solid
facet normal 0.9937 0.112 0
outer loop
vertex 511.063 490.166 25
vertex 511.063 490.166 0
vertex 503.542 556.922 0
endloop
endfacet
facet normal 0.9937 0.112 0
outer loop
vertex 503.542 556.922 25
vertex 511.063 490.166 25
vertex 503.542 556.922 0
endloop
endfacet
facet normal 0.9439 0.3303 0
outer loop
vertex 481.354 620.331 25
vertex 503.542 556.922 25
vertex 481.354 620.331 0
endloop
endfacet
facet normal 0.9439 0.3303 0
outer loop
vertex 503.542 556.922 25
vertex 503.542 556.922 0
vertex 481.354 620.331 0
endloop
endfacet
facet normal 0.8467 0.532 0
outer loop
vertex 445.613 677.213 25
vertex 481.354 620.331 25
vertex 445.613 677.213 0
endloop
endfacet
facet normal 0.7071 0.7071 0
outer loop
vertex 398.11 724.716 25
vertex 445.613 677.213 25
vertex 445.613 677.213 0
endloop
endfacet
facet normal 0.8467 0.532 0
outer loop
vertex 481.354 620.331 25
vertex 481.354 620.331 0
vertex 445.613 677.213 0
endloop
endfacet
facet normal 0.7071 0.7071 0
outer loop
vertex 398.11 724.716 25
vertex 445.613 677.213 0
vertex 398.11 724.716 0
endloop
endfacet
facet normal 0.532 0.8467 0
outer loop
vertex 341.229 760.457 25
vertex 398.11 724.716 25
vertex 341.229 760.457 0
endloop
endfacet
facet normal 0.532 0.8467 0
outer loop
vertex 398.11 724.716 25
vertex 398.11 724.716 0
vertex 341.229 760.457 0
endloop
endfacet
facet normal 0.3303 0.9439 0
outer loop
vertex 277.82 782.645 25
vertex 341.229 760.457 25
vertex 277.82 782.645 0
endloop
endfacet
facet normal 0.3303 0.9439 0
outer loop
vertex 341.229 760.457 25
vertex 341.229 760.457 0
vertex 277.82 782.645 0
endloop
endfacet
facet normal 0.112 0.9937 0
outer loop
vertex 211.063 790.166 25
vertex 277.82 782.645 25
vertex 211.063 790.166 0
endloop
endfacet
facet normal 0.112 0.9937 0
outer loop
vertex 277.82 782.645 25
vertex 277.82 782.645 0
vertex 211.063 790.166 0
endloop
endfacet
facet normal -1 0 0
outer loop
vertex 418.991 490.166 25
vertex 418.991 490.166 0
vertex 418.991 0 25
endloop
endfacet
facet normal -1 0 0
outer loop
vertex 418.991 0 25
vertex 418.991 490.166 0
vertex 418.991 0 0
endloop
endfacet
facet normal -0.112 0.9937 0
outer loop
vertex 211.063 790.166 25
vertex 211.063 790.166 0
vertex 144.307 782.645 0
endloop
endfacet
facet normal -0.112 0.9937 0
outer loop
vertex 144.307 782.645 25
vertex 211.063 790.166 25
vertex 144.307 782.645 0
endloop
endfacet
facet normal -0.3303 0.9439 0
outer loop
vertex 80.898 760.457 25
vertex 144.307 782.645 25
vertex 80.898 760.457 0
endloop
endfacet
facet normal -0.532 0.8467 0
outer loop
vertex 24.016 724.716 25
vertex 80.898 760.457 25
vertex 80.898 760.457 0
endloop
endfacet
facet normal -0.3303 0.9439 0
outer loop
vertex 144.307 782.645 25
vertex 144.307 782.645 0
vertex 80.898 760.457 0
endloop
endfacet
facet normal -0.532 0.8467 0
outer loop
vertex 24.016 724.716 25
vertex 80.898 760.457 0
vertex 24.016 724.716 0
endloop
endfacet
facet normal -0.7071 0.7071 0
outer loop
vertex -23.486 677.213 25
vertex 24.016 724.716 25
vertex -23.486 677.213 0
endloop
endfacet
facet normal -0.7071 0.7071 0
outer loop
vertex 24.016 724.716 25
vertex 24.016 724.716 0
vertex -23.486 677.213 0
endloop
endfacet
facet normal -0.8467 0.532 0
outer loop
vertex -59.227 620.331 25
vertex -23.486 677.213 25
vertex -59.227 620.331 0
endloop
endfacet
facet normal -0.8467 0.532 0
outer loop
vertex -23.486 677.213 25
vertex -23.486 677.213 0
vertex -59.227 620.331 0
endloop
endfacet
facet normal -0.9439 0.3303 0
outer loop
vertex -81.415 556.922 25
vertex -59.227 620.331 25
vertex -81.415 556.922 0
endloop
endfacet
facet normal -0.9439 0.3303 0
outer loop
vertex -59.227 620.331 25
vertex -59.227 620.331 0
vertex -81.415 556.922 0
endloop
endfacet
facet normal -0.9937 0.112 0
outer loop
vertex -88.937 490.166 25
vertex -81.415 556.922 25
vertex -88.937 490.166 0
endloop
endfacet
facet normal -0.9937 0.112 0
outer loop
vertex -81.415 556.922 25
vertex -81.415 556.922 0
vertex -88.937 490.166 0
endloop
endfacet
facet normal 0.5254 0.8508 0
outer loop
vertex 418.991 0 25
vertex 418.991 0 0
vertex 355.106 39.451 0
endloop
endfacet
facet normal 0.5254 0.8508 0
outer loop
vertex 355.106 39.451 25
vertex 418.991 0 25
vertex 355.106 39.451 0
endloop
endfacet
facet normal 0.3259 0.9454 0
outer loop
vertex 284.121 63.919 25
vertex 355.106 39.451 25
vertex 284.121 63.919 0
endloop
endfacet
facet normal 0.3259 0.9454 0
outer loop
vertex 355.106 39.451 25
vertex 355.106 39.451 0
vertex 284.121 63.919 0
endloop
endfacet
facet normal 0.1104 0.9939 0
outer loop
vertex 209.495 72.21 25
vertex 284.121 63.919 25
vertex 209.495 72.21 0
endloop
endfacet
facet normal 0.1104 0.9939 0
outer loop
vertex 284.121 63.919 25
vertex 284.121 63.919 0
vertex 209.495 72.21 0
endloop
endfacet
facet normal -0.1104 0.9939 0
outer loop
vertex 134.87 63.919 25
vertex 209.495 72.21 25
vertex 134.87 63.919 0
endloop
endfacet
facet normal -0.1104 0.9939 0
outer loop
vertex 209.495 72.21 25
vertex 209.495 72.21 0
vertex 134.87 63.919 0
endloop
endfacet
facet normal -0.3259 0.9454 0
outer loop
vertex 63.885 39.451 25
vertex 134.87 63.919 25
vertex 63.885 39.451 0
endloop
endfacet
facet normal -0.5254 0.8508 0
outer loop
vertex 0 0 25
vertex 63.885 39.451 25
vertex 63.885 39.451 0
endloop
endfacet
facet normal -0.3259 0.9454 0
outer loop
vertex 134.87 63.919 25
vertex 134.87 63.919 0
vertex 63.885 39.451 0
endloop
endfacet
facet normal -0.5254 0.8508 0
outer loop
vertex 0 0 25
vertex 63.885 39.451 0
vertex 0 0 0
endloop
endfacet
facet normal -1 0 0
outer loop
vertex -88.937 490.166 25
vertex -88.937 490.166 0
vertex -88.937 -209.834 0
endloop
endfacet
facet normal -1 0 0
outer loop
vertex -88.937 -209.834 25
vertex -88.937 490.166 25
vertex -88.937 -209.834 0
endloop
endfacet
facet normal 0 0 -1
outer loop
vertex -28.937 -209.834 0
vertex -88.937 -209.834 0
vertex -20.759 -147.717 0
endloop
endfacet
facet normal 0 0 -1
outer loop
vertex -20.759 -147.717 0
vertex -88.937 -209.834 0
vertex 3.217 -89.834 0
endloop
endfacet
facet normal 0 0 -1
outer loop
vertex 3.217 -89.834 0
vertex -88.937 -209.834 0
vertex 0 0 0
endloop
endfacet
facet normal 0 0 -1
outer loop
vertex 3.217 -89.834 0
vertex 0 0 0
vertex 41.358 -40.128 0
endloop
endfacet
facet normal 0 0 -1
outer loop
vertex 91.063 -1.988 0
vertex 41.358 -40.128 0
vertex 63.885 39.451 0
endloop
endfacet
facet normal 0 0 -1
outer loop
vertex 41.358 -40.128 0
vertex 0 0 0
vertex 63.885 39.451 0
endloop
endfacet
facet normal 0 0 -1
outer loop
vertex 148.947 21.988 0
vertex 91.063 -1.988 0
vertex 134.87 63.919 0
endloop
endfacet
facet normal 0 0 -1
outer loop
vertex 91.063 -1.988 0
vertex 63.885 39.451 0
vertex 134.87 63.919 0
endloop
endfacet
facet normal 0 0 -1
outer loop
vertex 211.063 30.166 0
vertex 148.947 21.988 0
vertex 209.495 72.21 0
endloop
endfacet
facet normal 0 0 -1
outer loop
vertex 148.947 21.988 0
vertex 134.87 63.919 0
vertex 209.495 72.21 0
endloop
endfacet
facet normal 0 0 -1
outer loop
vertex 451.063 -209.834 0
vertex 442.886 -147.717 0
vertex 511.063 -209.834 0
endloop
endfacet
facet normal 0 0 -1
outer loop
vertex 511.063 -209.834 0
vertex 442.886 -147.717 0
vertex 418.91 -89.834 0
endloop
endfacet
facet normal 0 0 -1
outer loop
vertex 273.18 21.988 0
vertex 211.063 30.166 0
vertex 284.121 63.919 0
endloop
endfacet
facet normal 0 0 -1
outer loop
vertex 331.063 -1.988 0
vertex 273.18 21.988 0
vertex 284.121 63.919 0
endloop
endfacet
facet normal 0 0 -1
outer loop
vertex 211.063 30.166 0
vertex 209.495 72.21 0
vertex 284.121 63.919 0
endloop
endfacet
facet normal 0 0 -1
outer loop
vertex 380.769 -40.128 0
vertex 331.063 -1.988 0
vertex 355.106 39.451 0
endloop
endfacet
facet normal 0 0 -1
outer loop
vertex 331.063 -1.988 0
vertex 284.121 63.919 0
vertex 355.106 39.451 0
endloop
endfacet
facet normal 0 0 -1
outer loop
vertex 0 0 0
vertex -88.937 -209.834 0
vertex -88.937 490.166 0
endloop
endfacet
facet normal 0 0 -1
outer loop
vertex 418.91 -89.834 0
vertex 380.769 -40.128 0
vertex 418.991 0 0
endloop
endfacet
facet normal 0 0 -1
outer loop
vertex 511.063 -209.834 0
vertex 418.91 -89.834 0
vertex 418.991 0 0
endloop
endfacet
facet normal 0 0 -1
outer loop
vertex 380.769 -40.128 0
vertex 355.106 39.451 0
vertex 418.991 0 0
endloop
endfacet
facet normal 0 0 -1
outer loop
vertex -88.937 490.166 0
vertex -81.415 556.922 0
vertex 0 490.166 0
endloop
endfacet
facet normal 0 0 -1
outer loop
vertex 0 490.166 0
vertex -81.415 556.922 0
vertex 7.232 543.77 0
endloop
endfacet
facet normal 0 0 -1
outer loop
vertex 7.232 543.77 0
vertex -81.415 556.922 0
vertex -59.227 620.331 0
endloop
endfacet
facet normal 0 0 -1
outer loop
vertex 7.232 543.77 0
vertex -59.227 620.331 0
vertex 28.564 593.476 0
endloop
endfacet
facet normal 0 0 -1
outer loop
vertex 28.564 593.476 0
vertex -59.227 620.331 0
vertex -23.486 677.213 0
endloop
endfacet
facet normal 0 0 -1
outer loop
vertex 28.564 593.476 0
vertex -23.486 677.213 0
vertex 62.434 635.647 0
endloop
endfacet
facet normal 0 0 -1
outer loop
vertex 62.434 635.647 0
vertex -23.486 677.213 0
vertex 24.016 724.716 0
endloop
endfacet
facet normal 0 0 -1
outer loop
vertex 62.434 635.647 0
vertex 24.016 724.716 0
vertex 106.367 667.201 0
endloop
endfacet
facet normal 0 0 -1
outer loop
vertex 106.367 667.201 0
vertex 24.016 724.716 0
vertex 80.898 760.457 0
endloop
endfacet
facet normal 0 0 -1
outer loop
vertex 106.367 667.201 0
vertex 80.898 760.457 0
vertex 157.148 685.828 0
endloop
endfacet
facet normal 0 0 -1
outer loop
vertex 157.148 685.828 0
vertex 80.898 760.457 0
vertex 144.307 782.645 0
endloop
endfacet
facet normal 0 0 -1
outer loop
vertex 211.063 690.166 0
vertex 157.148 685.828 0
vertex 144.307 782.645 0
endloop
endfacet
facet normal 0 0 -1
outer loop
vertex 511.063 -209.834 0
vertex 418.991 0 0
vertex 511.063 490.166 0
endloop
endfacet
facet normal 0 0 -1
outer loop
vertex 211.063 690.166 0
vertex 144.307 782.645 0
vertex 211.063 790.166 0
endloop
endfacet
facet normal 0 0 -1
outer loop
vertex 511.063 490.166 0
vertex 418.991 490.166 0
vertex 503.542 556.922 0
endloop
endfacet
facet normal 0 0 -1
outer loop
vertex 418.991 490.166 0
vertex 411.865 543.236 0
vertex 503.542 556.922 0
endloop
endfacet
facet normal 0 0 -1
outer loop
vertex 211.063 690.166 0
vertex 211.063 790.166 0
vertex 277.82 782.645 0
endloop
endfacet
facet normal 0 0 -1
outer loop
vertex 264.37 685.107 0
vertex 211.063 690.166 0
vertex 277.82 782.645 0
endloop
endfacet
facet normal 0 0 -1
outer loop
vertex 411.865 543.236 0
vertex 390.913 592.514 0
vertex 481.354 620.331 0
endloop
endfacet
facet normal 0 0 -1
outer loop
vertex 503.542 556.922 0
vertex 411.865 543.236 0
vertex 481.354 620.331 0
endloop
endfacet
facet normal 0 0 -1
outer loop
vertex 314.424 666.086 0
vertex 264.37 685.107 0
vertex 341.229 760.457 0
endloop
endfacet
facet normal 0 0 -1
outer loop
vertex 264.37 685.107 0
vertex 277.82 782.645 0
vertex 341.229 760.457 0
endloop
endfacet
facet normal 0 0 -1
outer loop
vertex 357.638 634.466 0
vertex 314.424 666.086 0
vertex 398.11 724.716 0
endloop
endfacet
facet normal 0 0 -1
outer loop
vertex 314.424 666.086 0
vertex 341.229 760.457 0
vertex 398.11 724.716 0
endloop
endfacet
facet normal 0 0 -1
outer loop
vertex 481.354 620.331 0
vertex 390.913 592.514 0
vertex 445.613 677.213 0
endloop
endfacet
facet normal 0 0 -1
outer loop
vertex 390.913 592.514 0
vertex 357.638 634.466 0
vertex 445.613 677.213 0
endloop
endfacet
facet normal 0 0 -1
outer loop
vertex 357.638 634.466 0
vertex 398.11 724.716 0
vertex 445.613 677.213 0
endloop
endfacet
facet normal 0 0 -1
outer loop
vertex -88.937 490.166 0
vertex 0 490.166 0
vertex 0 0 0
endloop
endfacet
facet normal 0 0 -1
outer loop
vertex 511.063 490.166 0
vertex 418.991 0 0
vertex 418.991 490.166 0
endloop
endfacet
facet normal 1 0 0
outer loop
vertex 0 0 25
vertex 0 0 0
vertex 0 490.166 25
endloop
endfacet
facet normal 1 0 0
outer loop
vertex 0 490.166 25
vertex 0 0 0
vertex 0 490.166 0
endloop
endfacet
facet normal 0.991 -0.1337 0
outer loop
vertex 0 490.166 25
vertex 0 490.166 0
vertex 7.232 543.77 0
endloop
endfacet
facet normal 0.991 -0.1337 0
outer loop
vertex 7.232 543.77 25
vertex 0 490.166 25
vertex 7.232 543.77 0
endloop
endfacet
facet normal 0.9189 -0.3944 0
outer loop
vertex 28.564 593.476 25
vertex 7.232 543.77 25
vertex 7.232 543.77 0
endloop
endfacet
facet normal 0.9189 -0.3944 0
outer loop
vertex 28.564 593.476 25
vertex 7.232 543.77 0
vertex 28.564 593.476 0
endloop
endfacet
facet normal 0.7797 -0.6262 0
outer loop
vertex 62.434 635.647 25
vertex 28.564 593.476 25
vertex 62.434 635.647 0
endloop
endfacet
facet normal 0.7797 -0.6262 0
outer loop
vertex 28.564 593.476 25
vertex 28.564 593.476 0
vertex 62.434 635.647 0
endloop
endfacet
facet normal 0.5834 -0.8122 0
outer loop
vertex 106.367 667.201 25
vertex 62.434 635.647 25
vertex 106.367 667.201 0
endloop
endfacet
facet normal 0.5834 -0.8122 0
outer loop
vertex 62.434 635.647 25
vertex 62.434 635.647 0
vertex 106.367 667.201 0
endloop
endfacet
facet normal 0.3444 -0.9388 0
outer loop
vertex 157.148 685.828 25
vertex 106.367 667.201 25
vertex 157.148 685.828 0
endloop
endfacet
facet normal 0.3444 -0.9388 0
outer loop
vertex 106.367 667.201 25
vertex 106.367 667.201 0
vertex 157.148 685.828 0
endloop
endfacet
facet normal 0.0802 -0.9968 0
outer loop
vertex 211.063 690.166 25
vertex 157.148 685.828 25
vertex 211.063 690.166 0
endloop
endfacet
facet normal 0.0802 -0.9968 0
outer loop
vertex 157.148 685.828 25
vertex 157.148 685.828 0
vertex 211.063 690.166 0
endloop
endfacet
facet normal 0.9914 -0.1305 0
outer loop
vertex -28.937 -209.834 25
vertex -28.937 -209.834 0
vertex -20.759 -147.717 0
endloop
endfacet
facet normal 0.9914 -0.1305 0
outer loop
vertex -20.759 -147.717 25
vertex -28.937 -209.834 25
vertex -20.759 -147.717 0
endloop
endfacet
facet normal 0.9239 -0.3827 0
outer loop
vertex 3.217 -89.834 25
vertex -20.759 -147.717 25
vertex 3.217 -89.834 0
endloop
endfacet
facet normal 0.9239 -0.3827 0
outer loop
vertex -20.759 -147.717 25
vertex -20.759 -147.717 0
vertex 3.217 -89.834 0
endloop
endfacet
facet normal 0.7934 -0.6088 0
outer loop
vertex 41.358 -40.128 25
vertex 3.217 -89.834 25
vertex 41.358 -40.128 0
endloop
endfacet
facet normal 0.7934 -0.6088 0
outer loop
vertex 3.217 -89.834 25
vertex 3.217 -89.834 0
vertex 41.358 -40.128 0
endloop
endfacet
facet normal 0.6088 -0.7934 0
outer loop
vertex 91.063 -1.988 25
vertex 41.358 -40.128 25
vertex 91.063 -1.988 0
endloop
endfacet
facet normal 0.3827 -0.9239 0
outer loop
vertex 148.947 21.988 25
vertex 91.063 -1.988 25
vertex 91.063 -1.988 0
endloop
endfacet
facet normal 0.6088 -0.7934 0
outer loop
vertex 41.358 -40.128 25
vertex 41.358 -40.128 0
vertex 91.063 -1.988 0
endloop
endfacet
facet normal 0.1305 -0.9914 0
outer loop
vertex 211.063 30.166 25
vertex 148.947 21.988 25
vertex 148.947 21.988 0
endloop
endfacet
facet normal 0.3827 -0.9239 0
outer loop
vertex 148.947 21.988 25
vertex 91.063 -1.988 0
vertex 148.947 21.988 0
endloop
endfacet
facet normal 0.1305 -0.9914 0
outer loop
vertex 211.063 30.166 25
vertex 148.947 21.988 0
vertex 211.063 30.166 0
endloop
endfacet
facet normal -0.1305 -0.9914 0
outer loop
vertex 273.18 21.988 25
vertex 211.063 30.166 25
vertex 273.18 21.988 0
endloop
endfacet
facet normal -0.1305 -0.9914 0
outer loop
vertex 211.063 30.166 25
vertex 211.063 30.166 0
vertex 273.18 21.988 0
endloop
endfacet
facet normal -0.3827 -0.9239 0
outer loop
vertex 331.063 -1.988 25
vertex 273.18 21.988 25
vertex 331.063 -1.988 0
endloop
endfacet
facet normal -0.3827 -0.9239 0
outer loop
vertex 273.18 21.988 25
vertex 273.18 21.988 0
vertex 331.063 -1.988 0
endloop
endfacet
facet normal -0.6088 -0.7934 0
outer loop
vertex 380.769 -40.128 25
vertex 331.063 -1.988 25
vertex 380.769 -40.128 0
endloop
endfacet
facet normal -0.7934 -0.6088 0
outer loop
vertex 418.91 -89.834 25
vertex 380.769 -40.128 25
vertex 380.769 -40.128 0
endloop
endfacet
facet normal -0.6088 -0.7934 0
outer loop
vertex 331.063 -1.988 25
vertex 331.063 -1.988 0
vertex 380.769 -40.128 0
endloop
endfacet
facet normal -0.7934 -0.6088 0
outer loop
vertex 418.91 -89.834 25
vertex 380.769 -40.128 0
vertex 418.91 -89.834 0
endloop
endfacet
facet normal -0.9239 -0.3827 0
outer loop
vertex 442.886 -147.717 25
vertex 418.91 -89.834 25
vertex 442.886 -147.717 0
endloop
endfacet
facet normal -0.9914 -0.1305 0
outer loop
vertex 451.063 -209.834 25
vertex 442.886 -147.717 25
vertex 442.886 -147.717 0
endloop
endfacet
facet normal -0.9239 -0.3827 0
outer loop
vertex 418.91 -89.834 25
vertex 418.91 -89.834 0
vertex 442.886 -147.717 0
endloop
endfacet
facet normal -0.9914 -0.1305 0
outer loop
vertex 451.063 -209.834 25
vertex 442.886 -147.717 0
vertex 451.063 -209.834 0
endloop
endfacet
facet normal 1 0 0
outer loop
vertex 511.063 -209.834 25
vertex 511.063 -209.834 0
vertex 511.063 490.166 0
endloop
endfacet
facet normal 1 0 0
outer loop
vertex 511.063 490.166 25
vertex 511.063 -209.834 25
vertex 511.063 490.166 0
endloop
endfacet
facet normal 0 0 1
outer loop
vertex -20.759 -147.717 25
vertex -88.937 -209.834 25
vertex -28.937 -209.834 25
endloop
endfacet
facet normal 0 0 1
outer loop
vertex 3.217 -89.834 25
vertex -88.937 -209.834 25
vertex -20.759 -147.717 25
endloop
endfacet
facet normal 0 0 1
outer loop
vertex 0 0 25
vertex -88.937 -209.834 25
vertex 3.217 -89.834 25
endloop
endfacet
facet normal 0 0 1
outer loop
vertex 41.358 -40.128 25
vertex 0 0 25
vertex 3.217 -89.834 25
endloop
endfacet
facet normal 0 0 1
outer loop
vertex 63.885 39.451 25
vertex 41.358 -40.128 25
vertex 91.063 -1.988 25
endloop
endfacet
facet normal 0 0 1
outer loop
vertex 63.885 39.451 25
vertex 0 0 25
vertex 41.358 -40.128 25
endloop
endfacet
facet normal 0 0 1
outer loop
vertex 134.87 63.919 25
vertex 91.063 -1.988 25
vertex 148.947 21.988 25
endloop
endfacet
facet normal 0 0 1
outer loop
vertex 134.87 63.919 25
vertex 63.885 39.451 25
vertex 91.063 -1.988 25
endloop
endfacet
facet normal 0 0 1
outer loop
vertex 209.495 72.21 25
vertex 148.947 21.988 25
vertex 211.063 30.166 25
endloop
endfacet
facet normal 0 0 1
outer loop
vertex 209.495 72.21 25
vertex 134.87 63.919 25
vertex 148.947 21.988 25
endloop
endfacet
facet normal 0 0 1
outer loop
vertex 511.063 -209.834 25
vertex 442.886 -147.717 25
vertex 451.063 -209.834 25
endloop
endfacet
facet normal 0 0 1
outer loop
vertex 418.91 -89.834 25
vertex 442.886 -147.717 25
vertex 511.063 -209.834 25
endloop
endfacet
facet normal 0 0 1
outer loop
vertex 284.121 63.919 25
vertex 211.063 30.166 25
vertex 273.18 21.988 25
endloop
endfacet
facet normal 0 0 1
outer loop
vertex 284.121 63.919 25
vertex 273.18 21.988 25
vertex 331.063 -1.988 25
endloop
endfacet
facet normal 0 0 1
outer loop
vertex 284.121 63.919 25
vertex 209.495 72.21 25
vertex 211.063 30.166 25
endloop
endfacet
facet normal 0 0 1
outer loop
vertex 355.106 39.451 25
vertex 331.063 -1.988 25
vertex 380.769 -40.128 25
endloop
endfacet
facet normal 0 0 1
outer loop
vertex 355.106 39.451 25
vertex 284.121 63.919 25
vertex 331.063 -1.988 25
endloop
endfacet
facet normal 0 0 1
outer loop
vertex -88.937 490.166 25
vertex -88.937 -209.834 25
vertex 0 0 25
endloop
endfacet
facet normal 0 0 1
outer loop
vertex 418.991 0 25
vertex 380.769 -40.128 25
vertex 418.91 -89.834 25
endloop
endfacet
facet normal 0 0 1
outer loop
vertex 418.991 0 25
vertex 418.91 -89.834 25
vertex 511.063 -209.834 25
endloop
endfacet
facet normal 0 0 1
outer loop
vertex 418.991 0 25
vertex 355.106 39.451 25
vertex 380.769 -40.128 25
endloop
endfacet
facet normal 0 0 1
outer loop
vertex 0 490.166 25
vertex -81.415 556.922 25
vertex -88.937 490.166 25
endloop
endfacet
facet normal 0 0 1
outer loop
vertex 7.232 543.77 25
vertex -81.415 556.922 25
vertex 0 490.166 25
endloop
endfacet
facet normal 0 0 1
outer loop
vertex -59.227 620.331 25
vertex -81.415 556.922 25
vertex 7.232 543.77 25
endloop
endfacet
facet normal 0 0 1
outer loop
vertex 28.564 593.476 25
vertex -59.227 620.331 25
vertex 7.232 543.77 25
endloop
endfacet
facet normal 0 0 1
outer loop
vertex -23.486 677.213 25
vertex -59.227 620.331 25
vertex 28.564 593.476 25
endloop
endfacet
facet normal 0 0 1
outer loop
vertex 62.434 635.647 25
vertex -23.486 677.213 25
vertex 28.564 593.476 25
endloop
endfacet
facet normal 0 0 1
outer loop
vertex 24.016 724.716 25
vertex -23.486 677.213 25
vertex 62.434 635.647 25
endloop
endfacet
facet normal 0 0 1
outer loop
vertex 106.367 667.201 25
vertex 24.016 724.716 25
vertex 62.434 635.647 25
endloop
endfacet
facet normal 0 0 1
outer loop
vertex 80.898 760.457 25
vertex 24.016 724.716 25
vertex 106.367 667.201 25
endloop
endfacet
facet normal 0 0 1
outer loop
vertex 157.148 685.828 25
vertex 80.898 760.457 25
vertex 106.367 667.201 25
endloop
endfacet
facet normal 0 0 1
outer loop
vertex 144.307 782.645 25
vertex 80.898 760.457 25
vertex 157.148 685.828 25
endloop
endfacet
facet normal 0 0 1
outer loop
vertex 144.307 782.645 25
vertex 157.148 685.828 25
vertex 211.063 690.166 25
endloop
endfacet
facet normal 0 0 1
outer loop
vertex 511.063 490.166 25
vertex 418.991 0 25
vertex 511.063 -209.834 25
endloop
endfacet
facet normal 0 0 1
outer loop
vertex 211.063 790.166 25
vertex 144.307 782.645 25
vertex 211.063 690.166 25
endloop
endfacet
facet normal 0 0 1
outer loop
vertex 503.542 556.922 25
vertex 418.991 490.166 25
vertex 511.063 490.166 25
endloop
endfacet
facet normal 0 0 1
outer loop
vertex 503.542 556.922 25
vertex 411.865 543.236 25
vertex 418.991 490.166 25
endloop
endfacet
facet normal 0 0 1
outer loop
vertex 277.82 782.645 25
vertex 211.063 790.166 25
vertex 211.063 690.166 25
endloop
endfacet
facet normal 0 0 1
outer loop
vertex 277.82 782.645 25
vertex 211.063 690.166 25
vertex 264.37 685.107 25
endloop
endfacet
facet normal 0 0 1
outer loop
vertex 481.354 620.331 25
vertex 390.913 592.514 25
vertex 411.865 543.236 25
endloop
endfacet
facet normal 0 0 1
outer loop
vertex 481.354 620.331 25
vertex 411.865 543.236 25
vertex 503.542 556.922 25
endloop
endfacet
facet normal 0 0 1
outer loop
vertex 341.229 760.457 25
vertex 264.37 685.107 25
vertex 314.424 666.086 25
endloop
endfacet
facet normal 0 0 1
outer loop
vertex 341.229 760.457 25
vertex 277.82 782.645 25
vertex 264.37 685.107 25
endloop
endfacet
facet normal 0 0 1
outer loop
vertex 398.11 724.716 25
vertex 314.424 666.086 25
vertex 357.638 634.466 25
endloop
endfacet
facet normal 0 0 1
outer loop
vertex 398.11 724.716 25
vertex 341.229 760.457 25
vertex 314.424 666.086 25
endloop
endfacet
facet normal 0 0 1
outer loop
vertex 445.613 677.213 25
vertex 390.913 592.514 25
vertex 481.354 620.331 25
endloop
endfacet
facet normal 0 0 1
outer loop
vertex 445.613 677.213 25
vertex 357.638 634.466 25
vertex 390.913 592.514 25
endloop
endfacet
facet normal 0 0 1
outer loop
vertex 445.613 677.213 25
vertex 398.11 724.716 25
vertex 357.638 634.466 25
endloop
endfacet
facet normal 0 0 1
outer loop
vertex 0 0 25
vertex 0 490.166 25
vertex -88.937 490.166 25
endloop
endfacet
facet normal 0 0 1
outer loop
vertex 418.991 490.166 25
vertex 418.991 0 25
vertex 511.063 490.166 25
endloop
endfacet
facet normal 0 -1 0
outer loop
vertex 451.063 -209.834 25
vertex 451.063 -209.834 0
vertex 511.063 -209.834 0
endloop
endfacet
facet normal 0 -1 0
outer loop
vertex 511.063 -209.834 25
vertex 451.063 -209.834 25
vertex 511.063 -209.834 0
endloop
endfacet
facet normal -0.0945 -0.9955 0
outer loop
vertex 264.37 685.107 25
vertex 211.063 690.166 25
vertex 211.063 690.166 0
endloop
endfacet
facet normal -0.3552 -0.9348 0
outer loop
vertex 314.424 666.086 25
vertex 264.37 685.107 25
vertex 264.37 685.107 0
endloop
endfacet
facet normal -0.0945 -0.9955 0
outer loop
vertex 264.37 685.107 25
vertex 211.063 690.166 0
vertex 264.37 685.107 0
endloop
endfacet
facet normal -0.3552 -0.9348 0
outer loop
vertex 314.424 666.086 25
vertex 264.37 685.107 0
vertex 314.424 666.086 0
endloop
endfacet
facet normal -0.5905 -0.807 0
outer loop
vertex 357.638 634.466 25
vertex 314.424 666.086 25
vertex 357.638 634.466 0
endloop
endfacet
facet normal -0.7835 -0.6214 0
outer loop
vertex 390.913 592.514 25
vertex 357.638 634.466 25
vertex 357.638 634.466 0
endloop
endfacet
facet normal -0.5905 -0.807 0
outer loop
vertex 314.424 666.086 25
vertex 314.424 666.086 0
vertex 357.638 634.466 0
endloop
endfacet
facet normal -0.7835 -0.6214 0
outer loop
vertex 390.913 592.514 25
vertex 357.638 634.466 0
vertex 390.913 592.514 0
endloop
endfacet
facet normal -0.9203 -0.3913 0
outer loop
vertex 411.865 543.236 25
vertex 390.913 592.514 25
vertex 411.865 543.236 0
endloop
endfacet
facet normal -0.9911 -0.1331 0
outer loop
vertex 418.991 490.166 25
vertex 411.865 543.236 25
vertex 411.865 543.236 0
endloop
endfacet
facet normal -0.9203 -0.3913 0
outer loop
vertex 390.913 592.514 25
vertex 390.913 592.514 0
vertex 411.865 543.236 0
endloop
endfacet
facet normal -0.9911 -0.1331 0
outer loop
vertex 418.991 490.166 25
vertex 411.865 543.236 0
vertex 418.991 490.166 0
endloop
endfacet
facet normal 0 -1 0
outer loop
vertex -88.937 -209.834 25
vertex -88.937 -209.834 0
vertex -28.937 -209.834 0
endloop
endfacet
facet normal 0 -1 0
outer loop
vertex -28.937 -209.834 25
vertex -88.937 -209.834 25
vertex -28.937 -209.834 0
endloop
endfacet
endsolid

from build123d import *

# Parameters (mm, degrees)
F1_DEPTH = 25


with BuildPart() as f1:
    # F0 (on Top) → F1 (new body)
    with BuildSketch(Plane.XY):
        with BuildLine():
            Line((-88.936575, 490.166194), (-88.936575, -209.833806))
            Line((-88.936575, -209.833806), (-28.936575, -209.833806))
            ThreePointArc((-28.936575, -209.833806), (211.063425, 30.166194), (451.063425, -209.833806))
            Line((451.063425, -209.833806), (511.063425, -209.833806))
            Line((511.063425, -209.833806), (511.063425, 490.166194))
            ThreePointArc((511.063425, 490.166194), (423.19546, 702.298228), (211.063425, 790.166194))
            ThreePointArc((211.063425, 790.166194), (-1.068609, 702.298228), (-88.936575, 490.166194))
        make_face()
        with BuildLine():
            ThreePointArc((0, 490.166194), (62.434461, 635.647461), (211.063425, 690.166194))
            ThreePointArc((211.063425, 690.166194), (357.637827, 634.46583), (418.990907, 490.166194))
            Line((418.990907, 490.166194), (418.990907, 0))
            ThreePointArc((418.990907, 0), (209.495453, 72.209681), (0, 0))
            Line((0, 0), (0, 490.166194))
        make_face(mode=Mode.SUBTRACT)
    extrude(amount=F1_DEPTH)


solid = f1.part
